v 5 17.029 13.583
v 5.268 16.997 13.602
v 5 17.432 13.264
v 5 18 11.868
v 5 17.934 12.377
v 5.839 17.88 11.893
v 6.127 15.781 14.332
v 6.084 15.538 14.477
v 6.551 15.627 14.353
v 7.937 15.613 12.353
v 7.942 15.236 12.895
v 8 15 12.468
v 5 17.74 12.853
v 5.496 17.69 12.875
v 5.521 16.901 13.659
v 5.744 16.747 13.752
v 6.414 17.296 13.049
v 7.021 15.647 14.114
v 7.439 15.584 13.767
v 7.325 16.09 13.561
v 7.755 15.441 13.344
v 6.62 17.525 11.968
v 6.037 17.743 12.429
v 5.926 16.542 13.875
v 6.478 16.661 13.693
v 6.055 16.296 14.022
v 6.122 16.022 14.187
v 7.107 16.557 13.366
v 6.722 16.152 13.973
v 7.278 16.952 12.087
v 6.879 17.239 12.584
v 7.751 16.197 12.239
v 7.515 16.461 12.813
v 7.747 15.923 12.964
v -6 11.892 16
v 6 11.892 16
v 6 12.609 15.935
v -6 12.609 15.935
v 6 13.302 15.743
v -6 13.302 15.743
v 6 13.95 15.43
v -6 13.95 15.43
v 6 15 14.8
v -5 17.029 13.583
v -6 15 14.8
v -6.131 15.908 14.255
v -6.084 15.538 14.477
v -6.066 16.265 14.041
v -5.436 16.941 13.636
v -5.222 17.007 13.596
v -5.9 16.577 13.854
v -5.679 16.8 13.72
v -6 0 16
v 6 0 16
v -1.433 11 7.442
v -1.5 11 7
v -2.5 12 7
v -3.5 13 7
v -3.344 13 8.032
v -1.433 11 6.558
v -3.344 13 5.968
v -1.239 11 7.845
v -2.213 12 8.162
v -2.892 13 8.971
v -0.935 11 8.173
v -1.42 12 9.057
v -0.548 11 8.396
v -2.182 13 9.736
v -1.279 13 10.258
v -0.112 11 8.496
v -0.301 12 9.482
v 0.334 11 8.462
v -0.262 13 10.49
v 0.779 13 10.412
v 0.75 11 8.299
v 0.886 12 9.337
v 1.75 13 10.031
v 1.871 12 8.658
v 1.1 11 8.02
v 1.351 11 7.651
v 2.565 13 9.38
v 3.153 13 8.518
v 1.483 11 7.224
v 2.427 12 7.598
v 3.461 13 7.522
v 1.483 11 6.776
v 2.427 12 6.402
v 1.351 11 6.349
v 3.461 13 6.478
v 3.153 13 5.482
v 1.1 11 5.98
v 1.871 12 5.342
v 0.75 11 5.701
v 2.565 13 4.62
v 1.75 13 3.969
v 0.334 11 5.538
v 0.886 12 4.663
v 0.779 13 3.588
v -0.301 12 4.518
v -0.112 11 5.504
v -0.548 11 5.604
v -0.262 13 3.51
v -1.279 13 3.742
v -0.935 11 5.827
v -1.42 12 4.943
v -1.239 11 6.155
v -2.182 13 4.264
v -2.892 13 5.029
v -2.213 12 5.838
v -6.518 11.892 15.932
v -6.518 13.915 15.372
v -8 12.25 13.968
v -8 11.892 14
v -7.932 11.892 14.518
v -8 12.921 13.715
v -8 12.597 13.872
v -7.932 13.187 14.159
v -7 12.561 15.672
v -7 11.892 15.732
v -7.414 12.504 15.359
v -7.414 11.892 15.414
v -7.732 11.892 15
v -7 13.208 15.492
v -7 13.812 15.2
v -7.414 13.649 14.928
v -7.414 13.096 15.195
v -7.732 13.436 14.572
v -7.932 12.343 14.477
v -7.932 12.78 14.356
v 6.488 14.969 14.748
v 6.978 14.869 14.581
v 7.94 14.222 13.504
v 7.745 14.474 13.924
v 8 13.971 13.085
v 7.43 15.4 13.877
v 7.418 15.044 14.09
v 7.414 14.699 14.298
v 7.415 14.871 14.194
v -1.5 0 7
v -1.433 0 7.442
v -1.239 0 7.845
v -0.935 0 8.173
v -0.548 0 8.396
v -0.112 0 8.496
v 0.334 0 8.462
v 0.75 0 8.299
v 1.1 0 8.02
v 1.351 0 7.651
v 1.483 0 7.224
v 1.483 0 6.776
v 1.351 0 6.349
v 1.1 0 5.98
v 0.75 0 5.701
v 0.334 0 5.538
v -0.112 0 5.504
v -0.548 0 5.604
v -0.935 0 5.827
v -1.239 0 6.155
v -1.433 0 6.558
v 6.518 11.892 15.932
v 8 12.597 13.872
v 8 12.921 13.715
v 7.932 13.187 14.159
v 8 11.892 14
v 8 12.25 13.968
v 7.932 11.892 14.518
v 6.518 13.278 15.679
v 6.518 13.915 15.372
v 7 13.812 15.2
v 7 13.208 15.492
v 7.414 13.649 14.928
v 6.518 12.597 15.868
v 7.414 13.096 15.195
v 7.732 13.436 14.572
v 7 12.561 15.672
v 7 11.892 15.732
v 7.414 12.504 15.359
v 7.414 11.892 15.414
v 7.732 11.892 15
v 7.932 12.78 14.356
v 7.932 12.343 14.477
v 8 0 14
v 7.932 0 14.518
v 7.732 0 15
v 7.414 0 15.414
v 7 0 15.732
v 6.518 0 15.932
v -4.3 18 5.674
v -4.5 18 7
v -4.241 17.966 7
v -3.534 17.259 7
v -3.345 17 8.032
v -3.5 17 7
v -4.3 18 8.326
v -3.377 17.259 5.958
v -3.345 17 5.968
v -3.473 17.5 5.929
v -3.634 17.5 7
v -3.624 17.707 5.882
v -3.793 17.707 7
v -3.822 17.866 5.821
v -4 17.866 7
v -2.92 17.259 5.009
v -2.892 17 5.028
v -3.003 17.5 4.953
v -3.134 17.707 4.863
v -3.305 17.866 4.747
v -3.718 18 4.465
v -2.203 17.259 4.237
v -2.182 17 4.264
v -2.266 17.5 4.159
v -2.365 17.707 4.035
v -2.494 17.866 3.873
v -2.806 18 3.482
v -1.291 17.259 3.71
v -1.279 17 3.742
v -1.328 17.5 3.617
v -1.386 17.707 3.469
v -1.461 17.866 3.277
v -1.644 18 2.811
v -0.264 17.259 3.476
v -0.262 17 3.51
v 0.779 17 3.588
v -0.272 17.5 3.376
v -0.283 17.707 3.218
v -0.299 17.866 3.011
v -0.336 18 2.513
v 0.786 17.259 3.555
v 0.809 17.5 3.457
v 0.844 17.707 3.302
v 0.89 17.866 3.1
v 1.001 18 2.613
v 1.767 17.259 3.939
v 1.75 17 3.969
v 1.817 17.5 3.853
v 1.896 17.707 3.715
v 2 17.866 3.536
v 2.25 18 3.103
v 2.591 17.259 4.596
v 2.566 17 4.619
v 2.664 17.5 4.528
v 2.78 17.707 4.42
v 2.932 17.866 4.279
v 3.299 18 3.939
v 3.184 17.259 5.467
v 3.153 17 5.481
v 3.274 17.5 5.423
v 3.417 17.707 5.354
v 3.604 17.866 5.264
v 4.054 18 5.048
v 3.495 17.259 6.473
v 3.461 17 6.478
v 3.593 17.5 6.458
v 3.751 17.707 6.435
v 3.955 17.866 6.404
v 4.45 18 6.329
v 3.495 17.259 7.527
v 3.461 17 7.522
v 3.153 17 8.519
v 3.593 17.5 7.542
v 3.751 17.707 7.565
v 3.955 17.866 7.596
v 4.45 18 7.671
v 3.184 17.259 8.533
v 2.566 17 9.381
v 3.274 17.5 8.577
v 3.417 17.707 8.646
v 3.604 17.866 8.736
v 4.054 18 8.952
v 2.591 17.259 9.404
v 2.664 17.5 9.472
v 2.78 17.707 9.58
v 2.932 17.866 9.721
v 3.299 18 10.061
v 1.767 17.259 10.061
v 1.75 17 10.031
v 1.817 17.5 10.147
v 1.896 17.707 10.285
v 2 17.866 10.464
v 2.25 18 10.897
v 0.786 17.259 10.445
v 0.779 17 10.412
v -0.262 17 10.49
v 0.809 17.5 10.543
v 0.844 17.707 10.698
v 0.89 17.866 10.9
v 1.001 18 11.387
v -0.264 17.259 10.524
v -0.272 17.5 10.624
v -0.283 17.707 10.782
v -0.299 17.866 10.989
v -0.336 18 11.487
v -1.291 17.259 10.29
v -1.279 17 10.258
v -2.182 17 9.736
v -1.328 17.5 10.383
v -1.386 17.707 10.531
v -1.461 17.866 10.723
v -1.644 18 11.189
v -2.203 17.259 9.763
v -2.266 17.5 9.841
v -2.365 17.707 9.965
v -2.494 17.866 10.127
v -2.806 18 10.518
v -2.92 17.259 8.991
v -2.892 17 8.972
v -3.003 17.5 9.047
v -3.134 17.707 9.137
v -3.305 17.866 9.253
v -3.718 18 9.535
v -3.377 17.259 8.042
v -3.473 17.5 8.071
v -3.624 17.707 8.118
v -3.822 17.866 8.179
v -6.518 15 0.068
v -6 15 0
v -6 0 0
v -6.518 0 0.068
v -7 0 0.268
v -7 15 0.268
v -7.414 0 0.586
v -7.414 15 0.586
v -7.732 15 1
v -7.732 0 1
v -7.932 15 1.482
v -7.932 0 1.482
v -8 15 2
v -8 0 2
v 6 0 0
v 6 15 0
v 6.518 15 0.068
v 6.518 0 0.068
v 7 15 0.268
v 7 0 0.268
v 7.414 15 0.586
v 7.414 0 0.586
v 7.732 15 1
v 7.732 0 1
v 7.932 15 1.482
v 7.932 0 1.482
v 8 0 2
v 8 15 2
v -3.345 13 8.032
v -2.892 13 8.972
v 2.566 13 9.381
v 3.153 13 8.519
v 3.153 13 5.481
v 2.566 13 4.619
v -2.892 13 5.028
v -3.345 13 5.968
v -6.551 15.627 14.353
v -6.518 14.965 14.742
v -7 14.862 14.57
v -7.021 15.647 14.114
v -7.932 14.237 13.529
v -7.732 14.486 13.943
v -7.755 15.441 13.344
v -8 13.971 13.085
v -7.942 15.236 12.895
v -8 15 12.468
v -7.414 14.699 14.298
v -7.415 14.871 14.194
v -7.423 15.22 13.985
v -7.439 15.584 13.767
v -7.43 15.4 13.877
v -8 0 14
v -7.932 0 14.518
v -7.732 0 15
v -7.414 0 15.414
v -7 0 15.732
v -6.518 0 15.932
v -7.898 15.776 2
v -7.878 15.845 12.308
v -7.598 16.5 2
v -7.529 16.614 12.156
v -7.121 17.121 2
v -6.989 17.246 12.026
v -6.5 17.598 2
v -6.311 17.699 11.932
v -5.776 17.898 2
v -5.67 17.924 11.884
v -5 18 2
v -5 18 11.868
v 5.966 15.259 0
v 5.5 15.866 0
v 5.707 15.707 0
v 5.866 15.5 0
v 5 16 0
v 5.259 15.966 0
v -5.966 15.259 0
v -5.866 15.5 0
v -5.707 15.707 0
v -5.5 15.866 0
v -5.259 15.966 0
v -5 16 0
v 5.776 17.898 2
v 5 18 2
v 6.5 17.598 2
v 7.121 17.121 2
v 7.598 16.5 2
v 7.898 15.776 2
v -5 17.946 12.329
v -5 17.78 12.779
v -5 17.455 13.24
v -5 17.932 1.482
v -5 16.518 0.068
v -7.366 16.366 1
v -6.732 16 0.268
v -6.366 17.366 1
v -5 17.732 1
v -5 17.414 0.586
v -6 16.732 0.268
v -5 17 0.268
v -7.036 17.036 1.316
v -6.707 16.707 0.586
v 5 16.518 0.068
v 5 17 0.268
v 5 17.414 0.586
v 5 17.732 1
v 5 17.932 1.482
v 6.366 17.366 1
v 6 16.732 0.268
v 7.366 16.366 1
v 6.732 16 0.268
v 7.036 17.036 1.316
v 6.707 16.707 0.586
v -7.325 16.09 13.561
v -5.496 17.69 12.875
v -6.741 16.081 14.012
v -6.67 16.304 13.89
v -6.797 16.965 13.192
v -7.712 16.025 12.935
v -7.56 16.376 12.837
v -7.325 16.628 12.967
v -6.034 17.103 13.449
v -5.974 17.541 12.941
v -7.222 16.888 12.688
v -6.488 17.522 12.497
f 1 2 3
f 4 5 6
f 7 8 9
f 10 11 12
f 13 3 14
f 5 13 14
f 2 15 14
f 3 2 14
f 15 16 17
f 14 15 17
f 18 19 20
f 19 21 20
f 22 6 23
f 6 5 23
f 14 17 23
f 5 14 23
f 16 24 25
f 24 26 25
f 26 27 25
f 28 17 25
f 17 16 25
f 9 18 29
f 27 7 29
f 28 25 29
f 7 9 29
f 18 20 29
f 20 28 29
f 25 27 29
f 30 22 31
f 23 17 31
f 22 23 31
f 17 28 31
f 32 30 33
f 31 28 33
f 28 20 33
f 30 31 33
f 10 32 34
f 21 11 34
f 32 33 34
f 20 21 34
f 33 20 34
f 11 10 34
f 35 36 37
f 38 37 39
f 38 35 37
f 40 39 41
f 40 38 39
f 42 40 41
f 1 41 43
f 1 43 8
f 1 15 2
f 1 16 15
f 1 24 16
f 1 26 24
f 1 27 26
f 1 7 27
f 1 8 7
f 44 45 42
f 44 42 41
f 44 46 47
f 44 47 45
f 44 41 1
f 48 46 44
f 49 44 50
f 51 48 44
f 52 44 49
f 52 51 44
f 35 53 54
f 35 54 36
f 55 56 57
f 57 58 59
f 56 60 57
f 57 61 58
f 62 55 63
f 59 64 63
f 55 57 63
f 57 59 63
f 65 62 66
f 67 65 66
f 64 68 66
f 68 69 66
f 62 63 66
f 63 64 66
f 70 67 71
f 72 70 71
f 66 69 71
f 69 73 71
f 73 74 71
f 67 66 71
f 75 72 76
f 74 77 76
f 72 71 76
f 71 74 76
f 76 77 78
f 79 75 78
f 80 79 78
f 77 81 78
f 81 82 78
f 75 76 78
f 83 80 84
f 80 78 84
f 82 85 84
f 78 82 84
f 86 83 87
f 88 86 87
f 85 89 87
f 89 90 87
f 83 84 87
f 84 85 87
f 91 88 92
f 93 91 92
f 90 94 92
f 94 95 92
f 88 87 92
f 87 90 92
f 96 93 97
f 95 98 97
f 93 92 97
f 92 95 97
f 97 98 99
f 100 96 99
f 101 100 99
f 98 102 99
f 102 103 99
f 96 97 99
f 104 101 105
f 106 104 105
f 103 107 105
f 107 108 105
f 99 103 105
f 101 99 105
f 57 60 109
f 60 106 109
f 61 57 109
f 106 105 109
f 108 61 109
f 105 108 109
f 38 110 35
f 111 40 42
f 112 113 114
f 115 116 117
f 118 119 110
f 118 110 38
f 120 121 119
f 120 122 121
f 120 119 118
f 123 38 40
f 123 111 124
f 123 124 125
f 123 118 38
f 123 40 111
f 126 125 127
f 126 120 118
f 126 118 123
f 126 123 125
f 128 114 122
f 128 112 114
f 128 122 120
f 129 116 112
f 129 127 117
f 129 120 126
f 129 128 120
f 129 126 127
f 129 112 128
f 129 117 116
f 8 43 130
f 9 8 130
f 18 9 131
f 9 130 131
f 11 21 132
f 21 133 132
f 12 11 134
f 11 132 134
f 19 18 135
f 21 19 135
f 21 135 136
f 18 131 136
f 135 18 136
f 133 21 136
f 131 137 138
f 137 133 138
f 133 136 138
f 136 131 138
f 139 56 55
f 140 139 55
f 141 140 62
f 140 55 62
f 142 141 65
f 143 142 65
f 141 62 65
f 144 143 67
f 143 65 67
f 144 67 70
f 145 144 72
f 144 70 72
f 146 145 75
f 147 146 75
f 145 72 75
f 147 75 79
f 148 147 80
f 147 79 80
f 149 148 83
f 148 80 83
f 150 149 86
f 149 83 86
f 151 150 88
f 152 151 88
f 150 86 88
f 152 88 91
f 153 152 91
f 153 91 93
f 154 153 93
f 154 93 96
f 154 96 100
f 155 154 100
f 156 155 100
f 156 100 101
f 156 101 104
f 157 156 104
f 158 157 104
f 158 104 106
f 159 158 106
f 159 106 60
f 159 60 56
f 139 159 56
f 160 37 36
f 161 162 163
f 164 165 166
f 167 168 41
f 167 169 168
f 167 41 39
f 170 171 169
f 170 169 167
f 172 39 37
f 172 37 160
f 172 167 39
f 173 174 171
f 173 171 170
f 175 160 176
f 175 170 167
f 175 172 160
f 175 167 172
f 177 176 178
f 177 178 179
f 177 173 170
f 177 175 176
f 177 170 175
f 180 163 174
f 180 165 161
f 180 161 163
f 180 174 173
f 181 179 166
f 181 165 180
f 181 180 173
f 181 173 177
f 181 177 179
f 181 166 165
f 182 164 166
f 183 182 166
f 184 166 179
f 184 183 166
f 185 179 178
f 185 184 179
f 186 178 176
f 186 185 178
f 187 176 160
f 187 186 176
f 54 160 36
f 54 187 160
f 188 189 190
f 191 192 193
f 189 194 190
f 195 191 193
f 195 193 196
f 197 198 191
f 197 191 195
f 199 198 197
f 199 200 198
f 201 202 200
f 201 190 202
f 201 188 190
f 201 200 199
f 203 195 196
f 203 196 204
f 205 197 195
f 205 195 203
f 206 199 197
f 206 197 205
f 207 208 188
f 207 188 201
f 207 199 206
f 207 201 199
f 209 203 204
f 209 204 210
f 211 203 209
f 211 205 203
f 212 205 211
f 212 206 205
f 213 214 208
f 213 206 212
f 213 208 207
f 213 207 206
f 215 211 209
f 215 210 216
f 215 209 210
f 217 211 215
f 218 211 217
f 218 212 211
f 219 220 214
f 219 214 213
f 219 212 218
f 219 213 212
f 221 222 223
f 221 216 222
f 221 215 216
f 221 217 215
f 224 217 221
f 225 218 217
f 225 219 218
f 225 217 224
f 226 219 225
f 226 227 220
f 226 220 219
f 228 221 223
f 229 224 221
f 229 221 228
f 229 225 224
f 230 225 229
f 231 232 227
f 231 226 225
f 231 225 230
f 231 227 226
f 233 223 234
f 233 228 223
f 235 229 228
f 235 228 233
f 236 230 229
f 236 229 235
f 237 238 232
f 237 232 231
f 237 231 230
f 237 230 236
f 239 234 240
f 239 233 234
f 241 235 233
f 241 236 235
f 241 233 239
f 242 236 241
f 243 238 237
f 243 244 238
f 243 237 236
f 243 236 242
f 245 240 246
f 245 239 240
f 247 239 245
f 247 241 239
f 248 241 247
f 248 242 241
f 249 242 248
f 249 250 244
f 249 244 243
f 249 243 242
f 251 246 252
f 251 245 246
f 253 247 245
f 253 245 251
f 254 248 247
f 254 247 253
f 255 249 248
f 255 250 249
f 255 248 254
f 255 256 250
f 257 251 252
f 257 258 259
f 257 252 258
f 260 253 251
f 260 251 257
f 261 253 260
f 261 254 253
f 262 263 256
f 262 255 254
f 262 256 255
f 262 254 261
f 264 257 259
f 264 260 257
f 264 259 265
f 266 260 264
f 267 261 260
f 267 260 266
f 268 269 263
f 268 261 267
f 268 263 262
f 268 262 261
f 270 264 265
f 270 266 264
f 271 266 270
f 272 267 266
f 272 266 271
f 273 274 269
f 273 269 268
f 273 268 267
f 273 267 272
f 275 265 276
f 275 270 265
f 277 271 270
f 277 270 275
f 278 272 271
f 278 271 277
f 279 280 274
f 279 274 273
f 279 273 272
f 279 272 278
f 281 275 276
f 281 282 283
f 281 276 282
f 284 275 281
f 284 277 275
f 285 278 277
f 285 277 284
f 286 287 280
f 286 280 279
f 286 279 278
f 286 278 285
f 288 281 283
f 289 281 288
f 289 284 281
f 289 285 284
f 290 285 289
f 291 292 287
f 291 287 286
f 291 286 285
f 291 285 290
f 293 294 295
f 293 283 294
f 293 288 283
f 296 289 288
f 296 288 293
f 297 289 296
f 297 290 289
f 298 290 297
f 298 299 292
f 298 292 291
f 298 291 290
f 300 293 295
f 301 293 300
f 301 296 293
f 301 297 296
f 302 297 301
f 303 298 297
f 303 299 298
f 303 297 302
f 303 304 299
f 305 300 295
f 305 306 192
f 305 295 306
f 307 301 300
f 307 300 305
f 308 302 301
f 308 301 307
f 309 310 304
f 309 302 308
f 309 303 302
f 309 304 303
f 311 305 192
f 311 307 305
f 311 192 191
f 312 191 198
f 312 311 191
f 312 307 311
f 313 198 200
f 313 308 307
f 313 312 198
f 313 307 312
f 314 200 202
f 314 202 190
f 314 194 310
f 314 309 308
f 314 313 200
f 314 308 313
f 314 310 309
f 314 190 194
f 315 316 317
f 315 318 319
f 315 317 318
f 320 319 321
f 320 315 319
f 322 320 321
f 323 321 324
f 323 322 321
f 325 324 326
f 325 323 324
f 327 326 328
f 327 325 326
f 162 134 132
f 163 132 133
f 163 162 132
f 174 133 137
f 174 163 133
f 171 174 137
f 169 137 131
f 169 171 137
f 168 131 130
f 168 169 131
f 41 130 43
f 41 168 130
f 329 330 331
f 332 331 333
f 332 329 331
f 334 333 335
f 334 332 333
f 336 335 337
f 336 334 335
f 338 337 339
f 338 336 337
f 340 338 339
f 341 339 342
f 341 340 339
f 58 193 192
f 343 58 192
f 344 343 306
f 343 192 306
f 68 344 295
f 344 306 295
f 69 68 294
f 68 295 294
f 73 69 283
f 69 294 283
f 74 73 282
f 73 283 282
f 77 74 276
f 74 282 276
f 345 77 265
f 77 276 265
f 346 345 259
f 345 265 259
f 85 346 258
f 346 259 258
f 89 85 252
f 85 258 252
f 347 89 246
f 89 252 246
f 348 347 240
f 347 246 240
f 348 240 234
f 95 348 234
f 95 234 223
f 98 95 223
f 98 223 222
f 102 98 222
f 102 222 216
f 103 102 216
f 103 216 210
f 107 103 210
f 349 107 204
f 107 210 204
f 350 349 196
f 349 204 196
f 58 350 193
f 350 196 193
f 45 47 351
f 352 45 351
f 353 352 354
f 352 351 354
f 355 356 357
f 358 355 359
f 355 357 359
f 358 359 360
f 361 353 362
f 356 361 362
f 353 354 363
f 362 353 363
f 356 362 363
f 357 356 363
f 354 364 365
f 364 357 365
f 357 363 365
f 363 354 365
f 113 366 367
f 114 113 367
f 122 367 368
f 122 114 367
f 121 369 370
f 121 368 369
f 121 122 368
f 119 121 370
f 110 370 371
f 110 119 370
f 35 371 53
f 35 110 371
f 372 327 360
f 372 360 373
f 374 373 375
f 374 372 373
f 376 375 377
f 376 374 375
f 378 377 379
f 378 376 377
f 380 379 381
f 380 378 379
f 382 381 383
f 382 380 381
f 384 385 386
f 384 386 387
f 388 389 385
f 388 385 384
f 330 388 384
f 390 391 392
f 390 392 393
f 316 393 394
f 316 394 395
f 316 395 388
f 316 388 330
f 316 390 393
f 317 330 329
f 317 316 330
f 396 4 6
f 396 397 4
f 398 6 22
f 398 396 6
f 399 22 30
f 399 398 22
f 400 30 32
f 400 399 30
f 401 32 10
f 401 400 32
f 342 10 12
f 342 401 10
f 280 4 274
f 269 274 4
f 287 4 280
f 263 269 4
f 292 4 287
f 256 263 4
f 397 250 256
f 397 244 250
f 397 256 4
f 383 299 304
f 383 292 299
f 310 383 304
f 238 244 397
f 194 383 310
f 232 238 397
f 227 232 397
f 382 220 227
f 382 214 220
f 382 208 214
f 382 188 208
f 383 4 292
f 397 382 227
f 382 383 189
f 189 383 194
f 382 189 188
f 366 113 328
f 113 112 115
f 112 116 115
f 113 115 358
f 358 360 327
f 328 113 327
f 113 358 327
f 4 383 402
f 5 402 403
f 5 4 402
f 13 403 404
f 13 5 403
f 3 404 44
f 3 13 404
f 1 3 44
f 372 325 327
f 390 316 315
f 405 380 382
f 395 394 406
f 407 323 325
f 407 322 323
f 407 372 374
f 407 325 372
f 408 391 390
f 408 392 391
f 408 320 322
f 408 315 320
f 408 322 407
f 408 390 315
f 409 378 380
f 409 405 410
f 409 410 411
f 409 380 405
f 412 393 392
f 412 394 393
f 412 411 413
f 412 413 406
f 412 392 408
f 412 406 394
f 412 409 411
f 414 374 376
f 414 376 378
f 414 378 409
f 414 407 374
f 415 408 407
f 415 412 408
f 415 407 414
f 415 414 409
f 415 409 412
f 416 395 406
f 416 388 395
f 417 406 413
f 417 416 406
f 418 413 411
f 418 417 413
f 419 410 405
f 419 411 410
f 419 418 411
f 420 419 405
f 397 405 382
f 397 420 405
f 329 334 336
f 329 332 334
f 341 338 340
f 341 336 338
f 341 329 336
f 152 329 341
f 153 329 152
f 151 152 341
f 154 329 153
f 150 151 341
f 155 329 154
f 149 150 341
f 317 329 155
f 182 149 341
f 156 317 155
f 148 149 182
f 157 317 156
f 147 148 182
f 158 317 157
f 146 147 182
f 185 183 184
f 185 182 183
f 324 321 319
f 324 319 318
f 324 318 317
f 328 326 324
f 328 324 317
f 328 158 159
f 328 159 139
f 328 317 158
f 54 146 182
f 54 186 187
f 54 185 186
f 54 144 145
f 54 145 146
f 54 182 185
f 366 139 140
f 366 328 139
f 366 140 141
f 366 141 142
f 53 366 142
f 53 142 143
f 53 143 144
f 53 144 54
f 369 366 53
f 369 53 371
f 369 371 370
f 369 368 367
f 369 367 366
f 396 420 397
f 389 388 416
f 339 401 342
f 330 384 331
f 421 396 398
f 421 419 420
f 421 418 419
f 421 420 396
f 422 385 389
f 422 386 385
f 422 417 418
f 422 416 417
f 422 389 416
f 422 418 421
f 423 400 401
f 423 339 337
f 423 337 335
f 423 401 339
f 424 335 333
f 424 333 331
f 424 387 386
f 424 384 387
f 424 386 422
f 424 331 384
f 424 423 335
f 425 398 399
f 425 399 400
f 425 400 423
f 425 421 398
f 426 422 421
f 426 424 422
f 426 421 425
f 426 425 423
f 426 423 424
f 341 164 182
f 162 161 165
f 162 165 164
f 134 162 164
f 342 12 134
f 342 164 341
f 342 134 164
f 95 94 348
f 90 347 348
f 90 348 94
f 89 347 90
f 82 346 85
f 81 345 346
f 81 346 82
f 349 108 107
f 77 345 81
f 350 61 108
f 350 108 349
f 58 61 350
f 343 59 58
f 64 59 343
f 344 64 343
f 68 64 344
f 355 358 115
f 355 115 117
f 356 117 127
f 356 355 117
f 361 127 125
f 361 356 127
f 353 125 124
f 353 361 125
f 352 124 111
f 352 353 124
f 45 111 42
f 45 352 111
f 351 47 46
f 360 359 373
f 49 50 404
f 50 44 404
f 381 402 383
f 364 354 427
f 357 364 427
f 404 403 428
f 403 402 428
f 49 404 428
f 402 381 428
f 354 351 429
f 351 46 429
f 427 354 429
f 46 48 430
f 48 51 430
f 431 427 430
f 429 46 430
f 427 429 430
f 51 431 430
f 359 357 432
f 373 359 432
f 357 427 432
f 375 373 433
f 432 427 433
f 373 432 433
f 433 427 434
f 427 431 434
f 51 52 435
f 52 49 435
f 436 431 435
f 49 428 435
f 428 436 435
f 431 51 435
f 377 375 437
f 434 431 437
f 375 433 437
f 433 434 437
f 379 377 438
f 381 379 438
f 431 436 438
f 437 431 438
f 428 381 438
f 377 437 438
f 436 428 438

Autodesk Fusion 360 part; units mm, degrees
sketch "Skizze1" plane through (0, 0, 0) normal (1, 0, 0) x (0, 0, -1)
  line L0 (0, 0) -> (-16, 0)
  line L1 (-16, 0) -> (-16, 13)
  line L2 (-16, 13) -> (-13, 18)
  line L3 (-13, 18) -> (0, 18)
  line L4 (0, 18) -> (0, 0)
  dimension "d1" = 18
  dimension "d2" = 13
  dimension "d3" = 16
  dimension "d5" = 3
extrude "Extrusion1" add sketch "Skizze1" along normal mid plane 16
fillet "Abrundung5" radius 3 2 edges at (8, 18, 6.5) (-8, 18, 6.5)
fillet "Abrundung1" radius 4 1 edges at (0, 13, 16)
fillet "Abrundung2" radius 2 1 edges at (0, 18, 13)
sketch "Skizze2" plane through (0, 18, 0) normal (0, 1, 0) x (-1, 0, 0)
  line L0 (5, 11.8676) -> (-5, 11.8676)
  line L1 (-5, 0) -> (5, 0)
  circle A0 centre (0, 7) radius 1.5
  circle A1 centre (0, 7) radius 3.5
  line L2 (-5, 11.8676) -> (-5, 0)
  line L3 (5, 0) -> (5, 11.8676)
  dimension "d12" = 3
  dimension "d13" = 7
  dimension "d14" = 7
extrude "Extrusion2" cut sketch "Skizze2" against normal blind 23 contours A0
extrude "Extrusion3" cut sketch "Skizze2" against normal blind 5 contours A1
chamfer "Fase2" distance 2 angle 45 1 edges at (1.3985, 13, 6.4576)
fillet "Abrundung3" radius 1 1 edges at (3.2631, 18, 8.2657)
fillet "Abrundung4" radius 2 1 edges at (0, 18, 0)
